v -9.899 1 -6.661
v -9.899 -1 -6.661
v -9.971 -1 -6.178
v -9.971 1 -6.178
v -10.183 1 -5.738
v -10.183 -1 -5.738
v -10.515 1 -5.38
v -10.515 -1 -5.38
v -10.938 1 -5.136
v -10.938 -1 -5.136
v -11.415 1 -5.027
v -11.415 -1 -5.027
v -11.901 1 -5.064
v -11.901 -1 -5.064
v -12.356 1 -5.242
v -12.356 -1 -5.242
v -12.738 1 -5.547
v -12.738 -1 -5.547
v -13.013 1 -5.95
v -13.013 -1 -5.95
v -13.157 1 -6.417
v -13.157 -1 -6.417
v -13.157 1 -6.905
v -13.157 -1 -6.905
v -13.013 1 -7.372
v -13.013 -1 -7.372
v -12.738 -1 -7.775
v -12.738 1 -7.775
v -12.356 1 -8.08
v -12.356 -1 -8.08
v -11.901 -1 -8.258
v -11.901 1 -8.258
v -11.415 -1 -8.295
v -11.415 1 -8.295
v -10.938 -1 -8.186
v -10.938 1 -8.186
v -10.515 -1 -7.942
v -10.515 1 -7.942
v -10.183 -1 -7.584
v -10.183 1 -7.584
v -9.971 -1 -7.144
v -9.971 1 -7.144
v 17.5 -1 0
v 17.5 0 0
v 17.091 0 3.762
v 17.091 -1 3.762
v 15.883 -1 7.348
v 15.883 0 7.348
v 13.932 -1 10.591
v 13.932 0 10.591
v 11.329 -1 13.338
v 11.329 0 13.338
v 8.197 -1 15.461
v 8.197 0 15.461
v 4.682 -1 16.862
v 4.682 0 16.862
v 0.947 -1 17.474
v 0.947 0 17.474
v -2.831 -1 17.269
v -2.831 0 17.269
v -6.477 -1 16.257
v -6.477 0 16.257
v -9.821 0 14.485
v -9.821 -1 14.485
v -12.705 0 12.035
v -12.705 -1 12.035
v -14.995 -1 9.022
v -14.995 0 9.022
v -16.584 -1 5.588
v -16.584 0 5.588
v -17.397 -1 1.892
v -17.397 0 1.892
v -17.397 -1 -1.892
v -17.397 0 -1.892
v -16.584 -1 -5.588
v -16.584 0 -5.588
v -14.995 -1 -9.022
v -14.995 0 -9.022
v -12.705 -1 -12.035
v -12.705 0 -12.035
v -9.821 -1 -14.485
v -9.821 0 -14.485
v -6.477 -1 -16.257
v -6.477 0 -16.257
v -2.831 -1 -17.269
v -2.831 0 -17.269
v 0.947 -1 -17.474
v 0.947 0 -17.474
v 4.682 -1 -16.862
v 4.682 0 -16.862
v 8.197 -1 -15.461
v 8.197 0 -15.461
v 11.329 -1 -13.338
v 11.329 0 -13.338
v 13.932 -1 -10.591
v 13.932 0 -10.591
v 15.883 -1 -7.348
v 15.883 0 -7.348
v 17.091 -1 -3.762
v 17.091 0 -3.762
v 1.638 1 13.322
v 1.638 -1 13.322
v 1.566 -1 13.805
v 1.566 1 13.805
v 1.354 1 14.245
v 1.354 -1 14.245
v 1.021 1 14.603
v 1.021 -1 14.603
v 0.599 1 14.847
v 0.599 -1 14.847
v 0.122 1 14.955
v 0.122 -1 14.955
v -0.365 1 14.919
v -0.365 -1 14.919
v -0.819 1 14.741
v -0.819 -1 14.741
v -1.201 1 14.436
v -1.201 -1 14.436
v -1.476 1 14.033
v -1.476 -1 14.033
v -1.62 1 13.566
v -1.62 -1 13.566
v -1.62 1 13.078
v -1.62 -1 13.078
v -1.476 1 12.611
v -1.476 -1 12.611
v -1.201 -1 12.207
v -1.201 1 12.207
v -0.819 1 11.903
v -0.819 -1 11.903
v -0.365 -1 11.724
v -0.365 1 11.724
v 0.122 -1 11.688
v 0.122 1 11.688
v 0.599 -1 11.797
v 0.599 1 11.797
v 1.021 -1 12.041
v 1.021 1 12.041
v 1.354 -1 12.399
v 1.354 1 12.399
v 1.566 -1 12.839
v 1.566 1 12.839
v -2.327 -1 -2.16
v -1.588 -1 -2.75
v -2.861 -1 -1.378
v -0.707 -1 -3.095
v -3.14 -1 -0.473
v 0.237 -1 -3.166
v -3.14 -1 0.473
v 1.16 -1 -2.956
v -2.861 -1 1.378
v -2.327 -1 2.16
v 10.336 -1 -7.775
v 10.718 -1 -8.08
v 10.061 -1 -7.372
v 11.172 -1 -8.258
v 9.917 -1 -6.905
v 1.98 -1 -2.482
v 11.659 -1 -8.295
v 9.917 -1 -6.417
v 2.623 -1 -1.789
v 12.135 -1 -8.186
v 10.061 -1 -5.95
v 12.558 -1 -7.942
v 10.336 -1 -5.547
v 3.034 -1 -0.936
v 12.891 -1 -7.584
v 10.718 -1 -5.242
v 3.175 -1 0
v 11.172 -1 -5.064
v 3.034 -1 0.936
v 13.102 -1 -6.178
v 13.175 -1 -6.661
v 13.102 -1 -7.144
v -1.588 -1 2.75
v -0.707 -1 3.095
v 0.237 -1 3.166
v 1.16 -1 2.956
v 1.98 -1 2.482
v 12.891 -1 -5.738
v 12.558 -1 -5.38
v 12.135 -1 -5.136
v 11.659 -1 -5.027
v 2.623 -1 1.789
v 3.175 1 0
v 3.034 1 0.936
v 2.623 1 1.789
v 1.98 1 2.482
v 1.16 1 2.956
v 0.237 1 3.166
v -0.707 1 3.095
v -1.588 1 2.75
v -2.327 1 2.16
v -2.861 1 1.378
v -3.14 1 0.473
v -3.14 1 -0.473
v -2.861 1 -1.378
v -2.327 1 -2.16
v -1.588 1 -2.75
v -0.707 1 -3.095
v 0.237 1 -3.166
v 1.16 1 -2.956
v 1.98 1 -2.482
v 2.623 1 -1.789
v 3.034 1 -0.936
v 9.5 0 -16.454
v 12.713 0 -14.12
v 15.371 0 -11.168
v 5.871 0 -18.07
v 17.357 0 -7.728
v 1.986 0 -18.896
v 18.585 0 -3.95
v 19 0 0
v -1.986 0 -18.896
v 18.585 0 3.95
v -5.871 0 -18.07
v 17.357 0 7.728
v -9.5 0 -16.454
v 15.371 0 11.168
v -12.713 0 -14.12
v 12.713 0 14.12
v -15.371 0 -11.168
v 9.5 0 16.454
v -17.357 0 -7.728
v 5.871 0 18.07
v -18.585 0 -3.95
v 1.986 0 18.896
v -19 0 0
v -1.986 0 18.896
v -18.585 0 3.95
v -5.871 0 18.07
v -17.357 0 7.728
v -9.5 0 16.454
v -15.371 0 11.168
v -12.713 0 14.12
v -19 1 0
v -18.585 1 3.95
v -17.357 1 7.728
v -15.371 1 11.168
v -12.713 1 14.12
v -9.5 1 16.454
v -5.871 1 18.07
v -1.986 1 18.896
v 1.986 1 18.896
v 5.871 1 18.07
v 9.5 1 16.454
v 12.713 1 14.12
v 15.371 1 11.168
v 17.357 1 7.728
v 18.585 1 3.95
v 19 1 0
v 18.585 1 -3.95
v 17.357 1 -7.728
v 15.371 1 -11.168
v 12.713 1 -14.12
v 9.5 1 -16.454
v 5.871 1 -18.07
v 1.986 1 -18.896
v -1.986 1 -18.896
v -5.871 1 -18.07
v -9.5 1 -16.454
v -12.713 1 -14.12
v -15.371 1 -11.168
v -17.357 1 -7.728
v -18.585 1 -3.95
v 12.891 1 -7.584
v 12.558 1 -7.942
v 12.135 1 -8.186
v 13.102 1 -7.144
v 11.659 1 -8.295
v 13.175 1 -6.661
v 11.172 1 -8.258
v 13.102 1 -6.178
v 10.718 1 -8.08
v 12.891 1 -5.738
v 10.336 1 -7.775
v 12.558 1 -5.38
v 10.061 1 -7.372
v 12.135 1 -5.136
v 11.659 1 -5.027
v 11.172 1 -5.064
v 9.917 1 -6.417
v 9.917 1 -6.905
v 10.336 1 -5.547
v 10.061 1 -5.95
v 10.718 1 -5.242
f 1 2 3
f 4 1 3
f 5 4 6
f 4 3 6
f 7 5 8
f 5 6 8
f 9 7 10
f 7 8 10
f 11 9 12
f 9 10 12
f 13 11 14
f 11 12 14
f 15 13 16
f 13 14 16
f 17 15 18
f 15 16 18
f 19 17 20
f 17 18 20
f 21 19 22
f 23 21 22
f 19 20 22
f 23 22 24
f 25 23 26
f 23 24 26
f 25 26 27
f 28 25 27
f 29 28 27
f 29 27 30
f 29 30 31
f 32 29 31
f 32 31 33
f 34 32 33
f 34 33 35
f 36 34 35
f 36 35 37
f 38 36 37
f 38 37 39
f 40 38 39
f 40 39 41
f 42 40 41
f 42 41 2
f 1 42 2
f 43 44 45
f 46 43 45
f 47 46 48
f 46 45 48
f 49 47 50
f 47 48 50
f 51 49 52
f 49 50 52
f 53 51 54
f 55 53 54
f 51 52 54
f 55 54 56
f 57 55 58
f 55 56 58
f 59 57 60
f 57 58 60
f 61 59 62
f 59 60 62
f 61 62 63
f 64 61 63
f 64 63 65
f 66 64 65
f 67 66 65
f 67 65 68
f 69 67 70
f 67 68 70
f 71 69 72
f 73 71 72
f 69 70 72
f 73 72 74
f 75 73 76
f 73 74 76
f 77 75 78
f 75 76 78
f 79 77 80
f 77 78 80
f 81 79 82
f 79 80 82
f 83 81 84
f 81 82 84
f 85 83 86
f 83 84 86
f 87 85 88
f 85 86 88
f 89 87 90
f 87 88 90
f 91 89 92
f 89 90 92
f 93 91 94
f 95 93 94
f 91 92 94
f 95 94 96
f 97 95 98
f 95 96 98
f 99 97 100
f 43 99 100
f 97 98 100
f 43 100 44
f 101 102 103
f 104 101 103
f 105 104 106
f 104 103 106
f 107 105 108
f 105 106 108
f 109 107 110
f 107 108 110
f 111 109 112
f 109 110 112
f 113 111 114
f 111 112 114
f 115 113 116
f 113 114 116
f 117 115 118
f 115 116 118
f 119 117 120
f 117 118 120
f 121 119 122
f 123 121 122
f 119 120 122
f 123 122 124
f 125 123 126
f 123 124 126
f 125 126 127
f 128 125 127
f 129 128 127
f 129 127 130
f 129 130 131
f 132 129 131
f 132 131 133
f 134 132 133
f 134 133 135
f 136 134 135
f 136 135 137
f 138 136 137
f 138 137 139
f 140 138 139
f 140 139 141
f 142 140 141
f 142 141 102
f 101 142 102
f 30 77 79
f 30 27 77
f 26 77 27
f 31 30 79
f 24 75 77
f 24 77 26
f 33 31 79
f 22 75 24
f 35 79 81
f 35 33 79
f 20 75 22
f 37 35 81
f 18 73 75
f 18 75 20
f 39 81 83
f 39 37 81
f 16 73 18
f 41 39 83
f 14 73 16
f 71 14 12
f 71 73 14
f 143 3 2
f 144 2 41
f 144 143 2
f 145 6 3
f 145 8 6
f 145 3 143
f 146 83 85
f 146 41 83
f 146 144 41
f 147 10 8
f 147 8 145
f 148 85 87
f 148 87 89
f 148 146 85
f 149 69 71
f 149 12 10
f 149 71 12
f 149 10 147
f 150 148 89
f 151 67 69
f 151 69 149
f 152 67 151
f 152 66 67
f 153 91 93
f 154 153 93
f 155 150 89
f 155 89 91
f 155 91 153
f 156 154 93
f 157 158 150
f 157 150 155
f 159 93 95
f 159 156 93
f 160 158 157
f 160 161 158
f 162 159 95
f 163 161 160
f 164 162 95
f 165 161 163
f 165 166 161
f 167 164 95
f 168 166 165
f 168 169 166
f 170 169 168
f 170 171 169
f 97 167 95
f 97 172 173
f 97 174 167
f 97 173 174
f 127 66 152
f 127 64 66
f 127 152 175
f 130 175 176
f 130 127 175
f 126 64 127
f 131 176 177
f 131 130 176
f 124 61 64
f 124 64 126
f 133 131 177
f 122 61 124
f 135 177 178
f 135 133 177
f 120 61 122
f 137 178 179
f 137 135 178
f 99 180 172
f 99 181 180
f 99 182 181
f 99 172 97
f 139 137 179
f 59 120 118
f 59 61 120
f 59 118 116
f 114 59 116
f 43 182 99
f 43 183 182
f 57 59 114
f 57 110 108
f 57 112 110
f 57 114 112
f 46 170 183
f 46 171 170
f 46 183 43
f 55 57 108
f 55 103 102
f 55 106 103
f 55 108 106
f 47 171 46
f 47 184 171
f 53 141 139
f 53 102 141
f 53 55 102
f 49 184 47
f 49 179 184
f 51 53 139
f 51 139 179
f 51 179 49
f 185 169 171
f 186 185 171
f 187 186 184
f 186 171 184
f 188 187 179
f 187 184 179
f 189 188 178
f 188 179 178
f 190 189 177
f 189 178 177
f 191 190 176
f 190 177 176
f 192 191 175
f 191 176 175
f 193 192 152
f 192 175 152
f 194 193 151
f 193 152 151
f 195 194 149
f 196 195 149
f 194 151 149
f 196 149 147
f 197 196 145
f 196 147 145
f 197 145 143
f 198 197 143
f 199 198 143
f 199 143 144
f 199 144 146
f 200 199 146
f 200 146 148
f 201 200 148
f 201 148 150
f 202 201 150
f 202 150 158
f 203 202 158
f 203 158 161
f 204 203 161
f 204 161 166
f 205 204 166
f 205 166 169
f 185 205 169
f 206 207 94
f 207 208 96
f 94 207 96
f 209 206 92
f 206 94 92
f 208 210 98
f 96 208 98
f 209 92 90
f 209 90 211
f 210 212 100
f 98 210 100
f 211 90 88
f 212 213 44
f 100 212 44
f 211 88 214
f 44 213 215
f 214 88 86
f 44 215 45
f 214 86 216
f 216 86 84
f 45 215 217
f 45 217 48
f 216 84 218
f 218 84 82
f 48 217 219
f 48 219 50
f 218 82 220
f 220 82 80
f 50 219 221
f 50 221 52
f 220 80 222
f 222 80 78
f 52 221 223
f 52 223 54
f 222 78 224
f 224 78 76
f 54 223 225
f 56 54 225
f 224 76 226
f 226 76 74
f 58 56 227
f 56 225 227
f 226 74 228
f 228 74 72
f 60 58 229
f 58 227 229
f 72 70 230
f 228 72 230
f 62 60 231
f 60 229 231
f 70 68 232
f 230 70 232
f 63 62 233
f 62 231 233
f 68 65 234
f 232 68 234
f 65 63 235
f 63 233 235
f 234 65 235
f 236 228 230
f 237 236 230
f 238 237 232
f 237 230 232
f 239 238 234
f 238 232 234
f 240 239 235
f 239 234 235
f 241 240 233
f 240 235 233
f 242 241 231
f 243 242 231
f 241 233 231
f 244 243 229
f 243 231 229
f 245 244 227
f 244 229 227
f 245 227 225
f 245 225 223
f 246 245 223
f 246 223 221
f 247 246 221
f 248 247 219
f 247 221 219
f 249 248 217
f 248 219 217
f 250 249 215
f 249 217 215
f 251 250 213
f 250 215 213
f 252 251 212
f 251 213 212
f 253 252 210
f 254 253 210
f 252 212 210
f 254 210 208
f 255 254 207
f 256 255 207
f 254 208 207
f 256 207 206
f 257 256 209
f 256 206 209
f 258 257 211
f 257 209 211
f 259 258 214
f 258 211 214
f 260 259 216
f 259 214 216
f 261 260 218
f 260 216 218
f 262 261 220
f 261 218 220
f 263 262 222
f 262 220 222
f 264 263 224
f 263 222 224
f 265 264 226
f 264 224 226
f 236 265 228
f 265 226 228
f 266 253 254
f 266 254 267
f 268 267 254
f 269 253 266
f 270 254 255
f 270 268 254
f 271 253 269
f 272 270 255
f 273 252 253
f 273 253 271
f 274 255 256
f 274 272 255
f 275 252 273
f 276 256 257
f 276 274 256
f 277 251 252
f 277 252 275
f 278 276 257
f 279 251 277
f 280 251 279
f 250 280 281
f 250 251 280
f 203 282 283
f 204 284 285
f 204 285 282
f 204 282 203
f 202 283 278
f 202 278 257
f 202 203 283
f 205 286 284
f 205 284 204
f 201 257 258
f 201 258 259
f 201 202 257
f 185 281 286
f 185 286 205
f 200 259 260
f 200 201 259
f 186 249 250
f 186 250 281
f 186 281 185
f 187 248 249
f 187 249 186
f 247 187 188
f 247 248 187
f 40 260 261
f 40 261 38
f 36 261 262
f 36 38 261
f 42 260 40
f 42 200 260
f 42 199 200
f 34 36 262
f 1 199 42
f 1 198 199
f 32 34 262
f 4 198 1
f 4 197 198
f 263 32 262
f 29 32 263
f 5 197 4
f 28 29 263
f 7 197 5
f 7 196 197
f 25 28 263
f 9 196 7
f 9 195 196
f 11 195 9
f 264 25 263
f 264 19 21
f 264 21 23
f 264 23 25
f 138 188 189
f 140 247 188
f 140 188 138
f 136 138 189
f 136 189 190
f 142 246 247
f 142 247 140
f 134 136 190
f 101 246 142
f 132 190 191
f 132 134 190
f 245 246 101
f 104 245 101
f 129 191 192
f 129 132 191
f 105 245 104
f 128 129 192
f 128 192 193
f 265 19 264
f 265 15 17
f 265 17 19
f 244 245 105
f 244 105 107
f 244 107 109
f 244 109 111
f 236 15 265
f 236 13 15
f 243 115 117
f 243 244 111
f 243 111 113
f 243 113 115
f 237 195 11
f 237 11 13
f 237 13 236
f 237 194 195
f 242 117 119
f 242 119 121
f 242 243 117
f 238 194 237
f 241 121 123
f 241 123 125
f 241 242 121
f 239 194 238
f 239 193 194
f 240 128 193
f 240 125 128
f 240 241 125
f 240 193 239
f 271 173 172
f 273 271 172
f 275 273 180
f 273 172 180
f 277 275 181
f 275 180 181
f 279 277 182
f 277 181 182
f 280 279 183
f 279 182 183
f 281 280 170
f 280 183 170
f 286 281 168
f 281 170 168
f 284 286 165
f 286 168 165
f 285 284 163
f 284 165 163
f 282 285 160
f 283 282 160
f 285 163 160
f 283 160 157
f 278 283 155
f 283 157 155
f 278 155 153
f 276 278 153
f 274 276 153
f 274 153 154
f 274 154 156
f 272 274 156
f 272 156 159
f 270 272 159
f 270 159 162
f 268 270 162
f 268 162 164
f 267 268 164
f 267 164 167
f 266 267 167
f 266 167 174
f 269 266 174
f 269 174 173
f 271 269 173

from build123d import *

# Parameters (mm, degrees)
F0_R     = 17.5
F1_DEPTH = 1
F2_R     = 19
F3_DEPTH = 1
F4_R     = 3.175
F5_DEPTH = 25.4
F6_R     = 1.6383
F7_DEPTH = 25.4


with BuildPart() as f1:
    # F0 (on Front) → F1 (new body)
    with BuildSketch(Plane.XZ):
        Circle(F0_R)
    extrude(amount=F1_DEPTH)

    # F2 (on face) → F3 (join)
    with BuildSketch(Plane(origin=(0, 0, 0), x_dir=(-1, 0, 0), z_dir=(0, 1, 0))):
        Circle(F2_R)
    extrude(amount=F3_DEPTH)

    # F4 (on face) → F5 (cut)
    with BuildSketch(Plane.XZ.offset(1)):
        Circle(F4_R)
    extrude(amount=-F5_DEPTH, mode=Mode.SUBTRACT)

    # F6 (on face) → F7 (cut)
    with BuildSketch(Plane.XZ.offset(1)):
        with Locations((0, 13.3217)):
            Circle(F6_R)
        with Locations((-11.536931, -6.66085)):
            Circle(F6_R)
        with Locations((11.536931, -6.66085)):
            Circle(F6_R)
    extrude(amount=-F7_DEPTH, mode=Mode.SUBTRACT)


solid = f1.part
